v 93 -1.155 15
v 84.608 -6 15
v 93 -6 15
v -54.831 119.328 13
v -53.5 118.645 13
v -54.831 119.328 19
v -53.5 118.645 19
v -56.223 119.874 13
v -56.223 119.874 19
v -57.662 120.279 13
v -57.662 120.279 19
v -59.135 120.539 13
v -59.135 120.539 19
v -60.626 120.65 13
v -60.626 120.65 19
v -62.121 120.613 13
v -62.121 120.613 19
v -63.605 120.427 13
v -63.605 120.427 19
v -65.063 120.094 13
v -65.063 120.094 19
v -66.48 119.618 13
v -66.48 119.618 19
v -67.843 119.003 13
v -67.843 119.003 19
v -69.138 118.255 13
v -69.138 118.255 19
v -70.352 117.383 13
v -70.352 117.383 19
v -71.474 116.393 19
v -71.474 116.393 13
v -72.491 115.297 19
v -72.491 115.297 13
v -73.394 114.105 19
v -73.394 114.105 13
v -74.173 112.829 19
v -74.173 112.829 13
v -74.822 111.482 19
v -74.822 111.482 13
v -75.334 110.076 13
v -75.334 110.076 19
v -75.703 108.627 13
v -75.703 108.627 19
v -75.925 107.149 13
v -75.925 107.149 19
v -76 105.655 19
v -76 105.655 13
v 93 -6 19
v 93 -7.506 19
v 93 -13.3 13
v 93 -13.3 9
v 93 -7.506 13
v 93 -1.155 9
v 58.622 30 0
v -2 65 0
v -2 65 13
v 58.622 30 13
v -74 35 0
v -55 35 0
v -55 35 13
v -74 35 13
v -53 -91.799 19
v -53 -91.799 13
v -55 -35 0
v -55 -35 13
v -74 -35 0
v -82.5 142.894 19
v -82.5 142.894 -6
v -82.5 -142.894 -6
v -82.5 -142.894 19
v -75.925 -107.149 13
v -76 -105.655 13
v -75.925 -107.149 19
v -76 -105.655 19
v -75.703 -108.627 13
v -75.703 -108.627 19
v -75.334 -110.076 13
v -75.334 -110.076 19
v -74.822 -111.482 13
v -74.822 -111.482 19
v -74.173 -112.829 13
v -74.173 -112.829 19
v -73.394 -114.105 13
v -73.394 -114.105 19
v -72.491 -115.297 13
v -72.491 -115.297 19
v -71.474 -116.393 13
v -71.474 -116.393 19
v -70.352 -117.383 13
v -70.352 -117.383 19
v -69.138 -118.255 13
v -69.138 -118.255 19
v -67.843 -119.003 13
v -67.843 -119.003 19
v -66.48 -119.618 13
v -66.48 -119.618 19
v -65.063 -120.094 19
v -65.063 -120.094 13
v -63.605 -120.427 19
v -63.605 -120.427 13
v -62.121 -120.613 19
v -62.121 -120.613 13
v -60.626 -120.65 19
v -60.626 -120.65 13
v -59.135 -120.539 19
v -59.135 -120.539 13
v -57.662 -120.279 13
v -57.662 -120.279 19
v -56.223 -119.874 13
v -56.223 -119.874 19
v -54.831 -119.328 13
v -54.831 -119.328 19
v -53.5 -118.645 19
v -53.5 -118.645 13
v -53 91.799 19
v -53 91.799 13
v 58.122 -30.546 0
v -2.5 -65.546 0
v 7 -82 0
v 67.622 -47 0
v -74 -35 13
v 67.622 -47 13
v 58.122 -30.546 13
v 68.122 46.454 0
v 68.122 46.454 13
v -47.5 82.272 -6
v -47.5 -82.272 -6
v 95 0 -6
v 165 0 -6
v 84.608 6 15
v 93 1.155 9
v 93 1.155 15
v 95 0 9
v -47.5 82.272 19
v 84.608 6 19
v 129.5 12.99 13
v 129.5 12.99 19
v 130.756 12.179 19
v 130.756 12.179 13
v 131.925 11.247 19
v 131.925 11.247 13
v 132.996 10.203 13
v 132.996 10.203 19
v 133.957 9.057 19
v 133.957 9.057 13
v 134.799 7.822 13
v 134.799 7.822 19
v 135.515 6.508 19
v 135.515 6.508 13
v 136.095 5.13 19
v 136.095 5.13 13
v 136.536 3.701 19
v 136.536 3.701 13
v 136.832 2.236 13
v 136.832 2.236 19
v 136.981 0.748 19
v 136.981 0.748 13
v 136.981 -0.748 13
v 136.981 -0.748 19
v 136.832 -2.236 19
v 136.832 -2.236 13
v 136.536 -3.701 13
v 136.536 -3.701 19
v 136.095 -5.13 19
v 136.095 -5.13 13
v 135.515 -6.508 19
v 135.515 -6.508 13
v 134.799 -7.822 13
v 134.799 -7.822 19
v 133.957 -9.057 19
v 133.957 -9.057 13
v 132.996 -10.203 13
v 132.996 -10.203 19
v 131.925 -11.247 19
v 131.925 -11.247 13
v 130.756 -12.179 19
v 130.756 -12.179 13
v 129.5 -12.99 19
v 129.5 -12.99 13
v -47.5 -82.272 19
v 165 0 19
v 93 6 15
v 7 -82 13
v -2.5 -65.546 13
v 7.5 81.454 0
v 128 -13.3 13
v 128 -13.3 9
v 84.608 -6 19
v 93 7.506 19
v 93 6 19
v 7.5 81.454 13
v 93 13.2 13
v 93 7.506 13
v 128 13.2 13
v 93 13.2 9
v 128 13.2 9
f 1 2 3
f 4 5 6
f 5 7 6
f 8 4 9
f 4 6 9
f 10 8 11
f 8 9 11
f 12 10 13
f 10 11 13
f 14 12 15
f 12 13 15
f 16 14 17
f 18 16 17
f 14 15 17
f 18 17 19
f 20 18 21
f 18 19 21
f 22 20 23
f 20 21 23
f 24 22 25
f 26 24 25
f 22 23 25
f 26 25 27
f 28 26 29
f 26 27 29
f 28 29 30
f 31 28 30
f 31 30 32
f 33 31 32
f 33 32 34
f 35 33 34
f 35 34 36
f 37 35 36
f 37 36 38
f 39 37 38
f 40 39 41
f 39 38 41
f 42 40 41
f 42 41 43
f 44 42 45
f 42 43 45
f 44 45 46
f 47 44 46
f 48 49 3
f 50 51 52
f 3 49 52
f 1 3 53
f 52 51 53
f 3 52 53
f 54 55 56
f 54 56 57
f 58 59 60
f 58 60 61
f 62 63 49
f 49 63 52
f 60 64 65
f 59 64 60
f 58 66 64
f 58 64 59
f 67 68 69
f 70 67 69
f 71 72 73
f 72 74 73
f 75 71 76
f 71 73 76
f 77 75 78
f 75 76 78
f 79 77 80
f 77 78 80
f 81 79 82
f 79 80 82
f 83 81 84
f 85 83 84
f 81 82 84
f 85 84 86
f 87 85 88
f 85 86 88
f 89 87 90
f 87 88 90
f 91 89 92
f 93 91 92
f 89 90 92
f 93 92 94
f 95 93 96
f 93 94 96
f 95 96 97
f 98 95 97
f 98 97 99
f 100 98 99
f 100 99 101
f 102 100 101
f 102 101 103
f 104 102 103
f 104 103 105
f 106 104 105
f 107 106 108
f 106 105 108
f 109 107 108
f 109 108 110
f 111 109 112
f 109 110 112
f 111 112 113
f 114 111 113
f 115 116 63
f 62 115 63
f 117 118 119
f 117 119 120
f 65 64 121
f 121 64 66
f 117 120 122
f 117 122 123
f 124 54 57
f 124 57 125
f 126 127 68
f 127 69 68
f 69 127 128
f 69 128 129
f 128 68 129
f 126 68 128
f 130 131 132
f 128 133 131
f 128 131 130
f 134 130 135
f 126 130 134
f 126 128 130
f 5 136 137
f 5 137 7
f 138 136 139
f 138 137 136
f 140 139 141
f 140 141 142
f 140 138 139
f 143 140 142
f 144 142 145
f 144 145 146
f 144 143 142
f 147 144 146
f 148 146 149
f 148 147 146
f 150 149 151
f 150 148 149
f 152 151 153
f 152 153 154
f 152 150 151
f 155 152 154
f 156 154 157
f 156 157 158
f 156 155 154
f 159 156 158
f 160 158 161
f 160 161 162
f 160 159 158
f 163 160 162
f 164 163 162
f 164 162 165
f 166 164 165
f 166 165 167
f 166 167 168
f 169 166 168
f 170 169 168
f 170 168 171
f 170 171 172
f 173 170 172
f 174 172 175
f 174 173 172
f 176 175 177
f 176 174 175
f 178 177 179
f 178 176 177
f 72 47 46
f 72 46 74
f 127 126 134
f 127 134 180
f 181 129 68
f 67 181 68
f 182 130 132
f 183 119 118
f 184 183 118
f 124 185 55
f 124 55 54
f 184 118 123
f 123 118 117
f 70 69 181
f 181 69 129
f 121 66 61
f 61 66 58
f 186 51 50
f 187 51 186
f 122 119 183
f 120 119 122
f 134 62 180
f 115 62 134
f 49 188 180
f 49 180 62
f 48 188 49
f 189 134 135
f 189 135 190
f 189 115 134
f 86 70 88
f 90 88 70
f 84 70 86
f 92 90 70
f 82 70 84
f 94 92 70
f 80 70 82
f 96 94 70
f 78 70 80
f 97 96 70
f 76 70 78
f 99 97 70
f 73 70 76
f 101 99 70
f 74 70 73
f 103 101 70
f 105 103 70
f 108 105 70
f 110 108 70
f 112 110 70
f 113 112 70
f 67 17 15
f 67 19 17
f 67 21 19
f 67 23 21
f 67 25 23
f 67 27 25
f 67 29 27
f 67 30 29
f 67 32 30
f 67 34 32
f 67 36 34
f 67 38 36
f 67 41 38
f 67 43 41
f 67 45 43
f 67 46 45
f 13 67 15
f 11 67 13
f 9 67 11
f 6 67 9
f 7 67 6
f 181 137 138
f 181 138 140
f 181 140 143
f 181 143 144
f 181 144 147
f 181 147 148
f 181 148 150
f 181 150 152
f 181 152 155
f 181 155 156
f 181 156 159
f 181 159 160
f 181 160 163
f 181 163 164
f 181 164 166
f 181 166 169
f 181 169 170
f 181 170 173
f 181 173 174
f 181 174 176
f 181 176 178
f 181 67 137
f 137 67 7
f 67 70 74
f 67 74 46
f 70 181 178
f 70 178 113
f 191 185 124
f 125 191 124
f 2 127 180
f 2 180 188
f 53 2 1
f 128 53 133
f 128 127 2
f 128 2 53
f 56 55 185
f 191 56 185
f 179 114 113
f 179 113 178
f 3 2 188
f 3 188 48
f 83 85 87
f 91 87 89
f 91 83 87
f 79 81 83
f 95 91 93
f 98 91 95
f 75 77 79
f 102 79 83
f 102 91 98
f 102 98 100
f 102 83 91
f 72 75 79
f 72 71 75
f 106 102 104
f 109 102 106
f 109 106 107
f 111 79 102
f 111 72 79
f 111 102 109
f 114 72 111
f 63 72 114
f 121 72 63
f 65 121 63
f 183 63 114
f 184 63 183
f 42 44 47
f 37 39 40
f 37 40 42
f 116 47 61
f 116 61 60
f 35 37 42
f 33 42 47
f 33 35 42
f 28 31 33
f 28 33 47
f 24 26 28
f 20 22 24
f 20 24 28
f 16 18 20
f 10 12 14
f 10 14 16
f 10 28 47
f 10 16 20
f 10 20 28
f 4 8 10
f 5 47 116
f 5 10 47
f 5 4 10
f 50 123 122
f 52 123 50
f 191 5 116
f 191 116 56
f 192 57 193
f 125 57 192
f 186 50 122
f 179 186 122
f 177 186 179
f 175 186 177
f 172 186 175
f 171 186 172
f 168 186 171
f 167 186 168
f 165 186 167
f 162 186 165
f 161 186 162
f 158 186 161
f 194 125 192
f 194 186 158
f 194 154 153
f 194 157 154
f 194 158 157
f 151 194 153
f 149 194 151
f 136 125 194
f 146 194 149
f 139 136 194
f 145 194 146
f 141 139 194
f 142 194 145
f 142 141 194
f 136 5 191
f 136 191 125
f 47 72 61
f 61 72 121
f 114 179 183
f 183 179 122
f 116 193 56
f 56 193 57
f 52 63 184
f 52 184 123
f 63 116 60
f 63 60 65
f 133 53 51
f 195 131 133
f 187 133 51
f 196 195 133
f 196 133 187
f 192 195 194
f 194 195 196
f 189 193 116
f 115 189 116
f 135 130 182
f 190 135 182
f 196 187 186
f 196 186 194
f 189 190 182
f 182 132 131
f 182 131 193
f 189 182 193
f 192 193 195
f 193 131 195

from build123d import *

# Parameters (mm, degrees)
PRISM003_DEPTH         = 6
PRISM002_DEPTH         = 6
BOX004_W               = 10
BOX004_H               = 12
BOX004_DEPTH           = 4
BOX003_W               = 35
BOX003_H               = 26.5
BOX003_DEPTH           = 10
BOX002_W               = 70
BOX002_H               = 19
BOX002_DEPTH           = 19
BOX002_PLACEMENT_ANGLE = 30
BOX001_W               = 70
BOX001_H               = 19
BOX001_DEPTH           = 19
BOX001_PLACEMENT_ANGLE = 90
BOX_W                  = 70
BOX_H                  = 19
BOX_DEPTH              = 19
BOX_PLACEMENT_ANGLE    = 30
PRISM001_DEPTH         = 25
PRISM_DEPTH            = 25
FILLET_R               = 15


with BuildPart() as prism003:
    # Prism003 → Prism003 (new body)
    with BuildSketch(Plane.XY.offset(13)):
        Polygon((106, 0), (-53, 91.798693), (-53, -91.798693), align=None)
    extrude(amount=PRISM003_DEPTH)


with BuildPart() as cut006:
    # Prism002 → Prism002 (new body)
    with BuildSketch(Plane.XY.offset(13)):
        Polygon((152, 0), (-76, 131.635861), (-76, -131.635861), align=None)
    extrude(amount=PRISM002_DEPTH)

    # Cut006: cut Prism003
    add(prism003.part, mode=Mode.SUBTRACT)


with BuildPart() as box004:
    # Box004 → Box004 (new body)
    with BuildSketch(Plane(origin=(84, -6, 15), x_dir=(1, 0, 0), z_dir=(0, 0, 1))):
        with Locations((5, 6)):
            Rectangle(BOX004_W, BOX004_H)
    extrude(amount=BOX004_DEPTH)


with BuildPart() as box003:
    # Box003 → Box003 (new body)
    with BuildSketch(Plane(origin=(93, -13.3, 9), x_dir=(1, 0, 0), z_dir=(0, 0, 1))):
        with Locations((17.5, 13.25)):
            Rectangle(BOX003_W, BOX003_H)
    extrude(amount=BOX003_DEPTH)


with BuildPart() as box002:
    # Box002 → Box002 (new body)
    with BuildSketch(Plane.XY):
        with Locations((35, 9.5)):
            Rectangle(BOX002_W, BOX002_H)
    extrude(amount=BOX002_DEPTH)


with BuildPart() as box002_1:
    # Box002 placement: moved
    add(box002.part.moved(Location((7, -82, 0))).rotate(Axis((7, -82, 0), (0, 0, 1)), BOX002_PLACEMENT_ANGLE))


with BuildPart() as box001:
    # Box001 → Box001 (new body)
    with BuildSketch(Plane.XY):
        with Locations((35, 9.5)):
            Rectangle(BOX001_W, BOX001_H)
    extrude(amount=BOX001_DEPTH)


with BuildPart() as box001_1:
    # Box001 placement: moved
    add(box001.part.moved(Location((-55, -35, 0))).rotate(Axis((-55, -35, 0), (0, 0, 1)), BOX001_PLACEMENT_ANGLE))


with BuildPart() as box:
    # Box → Box (new body)
    with BuildSketch(Plane.XY):
        with Locations((35, 9.5)):
            Rectangle(BOX_W, BOX_H)
    extrude(amount=BOX_DEPTH)


with BuildPart() as box_1:
    # Box placement: moved
    add(box.part.moved(Location((-2, 65, 0))).rotate(Axis((-2, 65, 0), (0, 0, -1)), BOX_PLACEMENT_ANGLE))


with BuildPart() as prism001:
    # Prism001 → Prism001 (new body)
    with BuildSketch(Plane.XY.offset(-6)):
        Polygon((95, 0), (-47.5, 82.272413), (-47.5, -82.272413), align=None)
    extrude(amount=PRISM001_DEPTH)


with BuildPart() as base_fillet:
    # Prism → Prism (new body)
    with BuildSketch(Plane.XY.offset(-6)):
        Polygon((165, 0), (-82.5, 142.894192), (-82.5, -142.894192), align=None)
    extrude(amount=PRISM_DEPTH)

    # Cut: cut Prism001
    add(prism001.part, mode=Mode.SUBTRACT)

    # Cut001: cut Box
    add(box_1.part, mode=Mode.SUBTRACT)

    # Cut002: cut Box001
    add(box001_1.part, mode=Mode.SUBTRACT)

    # Cut003: cut Box002
    add(box002_1.part, mode=Mode.SUBTRACT)

    # Cut004: cut Box003
    add(box003.part, mode=Mode.SUBTRACT)

    # Cut005: cut Box004
    add(box004.part, mode=Mode.SUBTRACT)

    # Cut007: cut Cut006
    add(cut006.part, mode=Mode.SUBTRACT)

    # Fillet
    fillet_edges = [base_fillet.edges().sort_by_distance(p)[0] for p in [
        (152, 0, 16),
        (-76, 131.635861, 16),
        (-76, -131.635861, 16),
    ]]
    fillet(fillet_edges, radius=FILLET_R)


solid = base_fillet.part
